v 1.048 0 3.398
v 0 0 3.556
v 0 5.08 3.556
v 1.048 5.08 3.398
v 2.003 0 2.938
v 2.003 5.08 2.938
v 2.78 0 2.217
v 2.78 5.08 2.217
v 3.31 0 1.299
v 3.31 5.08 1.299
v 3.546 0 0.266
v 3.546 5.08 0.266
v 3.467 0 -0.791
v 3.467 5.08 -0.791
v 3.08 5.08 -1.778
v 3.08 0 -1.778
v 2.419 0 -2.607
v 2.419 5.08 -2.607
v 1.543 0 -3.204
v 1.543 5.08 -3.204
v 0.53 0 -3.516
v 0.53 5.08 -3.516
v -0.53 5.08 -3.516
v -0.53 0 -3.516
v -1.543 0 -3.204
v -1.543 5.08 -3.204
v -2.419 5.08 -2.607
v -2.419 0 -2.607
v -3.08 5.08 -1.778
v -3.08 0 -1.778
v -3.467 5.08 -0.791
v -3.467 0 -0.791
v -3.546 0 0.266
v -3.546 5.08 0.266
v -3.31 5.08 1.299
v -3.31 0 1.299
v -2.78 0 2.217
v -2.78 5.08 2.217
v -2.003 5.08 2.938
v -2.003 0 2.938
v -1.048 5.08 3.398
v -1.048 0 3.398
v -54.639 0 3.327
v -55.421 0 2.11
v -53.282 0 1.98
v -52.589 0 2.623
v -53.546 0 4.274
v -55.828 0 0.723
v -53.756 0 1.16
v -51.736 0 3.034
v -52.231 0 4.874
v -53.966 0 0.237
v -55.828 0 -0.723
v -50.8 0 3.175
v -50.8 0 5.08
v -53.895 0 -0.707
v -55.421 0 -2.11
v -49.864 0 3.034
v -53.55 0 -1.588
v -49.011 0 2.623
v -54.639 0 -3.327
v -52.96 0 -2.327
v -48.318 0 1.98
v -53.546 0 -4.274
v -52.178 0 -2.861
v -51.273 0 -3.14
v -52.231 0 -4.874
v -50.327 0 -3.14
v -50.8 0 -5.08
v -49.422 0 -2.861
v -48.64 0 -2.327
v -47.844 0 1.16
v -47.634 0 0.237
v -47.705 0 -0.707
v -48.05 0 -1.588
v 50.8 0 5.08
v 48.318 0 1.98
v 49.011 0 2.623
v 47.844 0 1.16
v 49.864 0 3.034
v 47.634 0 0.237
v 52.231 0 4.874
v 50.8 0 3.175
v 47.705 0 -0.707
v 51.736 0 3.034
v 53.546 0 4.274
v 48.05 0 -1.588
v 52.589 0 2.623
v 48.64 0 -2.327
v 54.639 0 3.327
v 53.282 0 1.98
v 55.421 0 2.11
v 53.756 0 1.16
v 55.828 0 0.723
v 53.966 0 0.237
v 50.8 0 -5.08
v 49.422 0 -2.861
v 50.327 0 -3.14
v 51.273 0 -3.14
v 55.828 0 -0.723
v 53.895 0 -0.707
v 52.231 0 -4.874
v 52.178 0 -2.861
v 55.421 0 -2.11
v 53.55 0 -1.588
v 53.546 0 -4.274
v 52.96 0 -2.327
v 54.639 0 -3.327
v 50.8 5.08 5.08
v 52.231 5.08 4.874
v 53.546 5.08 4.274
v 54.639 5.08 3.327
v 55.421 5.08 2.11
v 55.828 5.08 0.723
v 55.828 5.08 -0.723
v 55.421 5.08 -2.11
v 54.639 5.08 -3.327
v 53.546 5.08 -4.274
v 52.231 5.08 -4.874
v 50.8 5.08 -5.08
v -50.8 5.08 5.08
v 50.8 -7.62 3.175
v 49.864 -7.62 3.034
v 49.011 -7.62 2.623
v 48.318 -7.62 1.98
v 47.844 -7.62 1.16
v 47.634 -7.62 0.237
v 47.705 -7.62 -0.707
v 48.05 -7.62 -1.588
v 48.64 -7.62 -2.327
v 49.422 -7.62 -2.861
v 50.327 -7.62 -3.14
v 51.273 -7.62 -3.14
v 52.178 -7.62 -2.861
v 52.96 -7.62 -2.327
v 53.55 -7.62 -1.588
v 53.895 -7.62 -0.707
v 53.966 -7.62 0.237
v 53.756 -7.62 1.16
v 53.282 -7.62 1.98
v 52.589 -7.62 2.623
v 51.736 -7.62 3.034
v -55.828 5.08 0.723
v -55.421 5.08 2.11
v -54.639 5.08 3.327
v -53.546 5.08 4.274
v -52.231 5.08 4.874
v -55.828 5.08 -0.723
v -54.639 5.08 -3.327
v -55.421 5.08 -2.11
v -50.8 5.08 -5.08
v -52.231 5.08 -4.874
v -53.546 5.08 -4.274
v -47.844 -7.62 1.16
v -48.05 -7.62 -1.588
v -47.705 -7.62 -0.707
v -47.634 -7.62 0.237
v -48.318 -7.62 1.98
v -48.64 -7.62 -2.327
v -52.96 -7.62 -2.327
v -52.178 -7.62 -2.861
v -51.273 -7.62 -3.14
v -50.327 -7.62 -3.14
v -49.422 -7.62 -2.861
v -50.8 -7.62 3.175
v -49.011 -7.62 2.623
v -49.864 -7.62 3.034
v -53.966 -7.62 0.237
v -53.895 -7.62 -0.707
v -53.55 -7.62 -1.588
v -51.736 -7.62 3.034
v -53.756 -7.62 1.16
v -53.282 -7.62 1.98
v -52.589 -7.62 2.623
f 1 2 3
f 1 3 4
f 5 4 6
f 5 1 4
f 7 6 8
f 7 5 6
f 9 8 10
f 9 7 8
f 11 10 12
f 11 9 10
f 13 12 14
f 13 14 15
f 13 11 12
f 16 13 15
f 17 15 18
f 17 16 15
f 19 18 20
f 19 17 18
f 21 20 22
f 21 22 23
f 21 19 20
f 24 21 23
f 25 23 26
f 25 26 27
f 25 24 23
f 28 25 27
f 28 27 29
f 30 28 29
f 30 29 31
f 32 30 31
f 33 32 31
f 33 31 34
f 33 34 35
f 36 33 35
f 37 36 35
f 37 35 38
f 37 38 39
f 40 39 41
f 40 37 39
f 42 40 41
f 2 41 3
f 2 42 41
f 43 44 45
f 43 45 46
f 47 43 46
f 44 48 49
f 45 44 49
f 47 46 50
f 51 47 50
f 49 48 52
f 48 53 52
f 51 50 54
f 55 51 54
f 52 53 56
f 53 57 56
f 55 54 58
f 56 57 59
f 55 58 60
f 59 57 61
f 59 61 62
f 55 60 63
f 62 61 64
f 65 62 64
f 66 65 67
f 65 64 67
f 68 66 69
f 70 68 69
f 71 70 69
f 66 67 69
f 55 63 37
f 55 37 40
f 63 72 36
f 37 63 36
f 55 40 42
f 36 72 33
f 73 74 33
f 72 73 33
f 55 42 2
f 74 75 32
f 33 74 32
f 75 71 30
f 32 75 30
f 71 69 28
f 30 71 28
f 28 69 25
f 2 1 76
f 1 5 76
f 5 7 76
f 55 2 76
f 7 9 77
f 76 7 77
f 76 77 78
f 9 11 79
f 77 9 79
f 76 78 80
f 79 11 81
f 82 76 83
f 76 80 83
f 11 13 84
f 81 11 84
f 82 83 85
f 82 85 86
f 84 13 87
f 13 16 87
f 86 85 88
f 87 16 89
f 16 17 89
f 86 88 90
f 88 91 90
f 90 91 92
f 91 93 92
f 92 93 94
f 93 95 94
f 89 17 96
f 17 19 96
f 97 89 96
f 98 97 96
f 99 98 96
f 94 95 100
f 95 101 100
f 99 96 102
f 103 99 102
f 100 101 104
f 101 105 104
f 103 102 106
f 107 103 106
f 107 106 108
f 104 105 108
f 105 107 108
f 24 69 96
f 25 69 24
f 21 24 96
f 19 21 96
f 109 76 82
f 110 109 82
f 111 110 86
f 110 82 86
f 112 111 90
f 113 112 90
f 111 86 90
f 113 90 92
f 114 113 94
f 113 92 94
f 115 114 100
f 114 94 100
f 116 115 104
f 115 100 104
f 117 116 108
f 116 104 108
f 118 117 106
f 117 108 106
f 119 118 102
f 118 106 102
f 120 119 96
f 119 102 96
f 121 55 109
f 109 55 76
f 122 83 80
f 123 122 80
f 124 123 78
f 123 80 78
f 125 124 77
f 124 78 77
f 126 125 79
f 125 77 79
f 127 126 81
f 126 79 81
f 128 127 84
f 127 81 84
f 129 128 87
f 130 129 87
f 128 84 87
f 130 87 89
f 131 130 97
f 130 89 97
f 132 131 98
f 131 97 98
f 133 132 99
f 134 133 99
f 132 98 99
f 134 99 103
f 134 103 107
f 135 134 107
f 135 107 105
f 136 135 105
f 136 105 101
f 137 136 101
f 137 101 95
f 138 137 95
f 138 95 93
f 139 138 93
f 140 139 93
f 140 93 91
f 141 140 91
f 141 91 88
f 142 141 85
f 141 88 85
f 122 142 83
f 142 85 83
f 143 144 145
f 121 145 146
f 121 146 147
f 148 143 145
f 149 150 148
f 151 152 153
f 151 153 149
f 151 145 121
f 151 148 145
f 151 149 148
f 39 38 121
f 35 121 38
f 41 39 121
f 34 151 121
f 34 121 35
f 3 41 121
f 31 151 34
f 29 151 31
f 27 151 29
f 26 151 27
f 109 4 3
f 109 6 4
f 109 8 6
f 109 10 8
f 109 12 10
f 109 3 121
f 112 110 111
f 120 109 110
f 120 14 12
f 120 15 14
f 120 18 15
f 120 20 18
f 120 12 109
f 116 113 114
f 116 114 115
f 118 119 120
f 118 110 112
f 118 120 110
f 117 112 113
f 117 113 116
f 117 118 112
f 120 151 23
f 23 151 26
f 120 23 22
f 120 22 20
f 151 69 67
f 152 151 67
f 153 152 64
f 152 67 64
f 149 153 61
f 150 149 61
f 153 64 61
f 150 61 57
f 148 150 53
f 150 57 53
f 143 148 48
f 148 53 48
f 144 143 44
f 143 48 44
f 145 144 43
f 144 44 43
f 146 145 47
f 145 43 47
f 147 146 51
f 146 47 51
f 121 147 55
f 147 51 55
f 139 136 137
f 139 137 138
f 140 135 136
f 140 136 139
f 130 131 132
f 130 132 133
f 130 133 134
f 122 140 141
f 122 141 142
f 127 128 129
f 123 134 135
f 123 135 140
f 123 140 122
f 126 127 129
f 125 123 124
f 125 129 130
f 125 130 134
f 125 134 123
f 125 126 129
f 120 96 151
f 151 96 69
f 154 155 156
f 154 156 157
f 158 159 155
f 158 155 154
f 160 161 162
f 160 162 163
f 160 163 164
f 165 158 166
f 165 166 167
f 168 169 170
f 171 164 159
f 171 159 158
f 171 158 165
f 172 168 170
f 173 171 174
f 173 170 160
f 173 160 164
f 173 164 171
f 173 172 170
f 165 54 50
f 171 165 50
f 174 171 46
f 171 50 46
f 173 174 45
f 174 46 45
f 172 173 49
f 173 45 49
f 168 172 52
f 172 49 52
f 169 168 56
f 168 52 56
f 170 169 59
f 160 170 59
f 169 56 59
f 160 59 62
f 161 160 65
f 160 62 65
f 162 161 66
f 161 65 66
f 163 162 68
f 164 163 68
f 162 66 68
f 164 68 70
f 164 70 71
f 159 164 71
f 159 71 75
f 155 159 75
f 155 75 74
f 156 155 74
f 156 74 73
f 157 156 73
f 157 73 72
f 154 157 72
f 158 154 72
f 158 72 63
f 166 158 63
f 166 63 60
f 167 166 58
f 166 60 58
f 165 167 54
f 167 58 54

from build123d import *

# Parameters (mm, degrees)
BOSS_EXTRUDE1_DEPTH = 5.08
SKETCH3_R           = 3.175
BOSS_EXTRUDE2_DEPTH = 7.62
SKETCH7_R           = 3.556
CUT_EXTRUDE1_DEPTH  = 5.08


with BuildPart() as part:
    # Sketch2 → Boss-Extrude1 (new body)
    with BuildSketch(Plane(origin=(0, 0, 0), x_dir=(1, 0, 0), z_dir=(0, 1, 0))):
        with BuildLine():
            Line((-50.8, -5.08), (50.8, -5.08))
            ThreePointArc((50.8, -5.08), (55.88, 0), (50.8, 5.08))
            Line((50.8, 5.08), (-50.8, 5.08))
            ThreePointArc((-50.8, 5.08), (-55.88, 0), (-50.8, -5.08))
        make_face()
    extrude(amount=BOSS_EXTRUDE1_DEPTH)

    # Sketch3 → Boss-Extrude2 (add)
    with BuildSketch(Plane.XZ):
        with Locations(Location((-50.8, 0, 0), (0, 0, 90))):
            Circle(SKETCH3_R)
        with Locations(Location((50.8, 0, 0), (0, 0, 90))):
            Circle(SKETCH3_R)
    extrude(amount=BOSS_EXTRUDE2_DEPTH)

    # Sketch7 → Cut-Extrude1 (cut)
    with BuildSketch(Plane(origin=(0, 0, 0), x_dir=(1, 0, 0), z_dir=(0, 1, 0))):
        with Locations(Location((0, 0, 0), (0, 0, 270))):
            Circle(SKETCH7_R)
    extrude(amount=CUT_EXTRUDE1_DEPTH, mode=Mode.SUBTRACT)


solid = part.part
